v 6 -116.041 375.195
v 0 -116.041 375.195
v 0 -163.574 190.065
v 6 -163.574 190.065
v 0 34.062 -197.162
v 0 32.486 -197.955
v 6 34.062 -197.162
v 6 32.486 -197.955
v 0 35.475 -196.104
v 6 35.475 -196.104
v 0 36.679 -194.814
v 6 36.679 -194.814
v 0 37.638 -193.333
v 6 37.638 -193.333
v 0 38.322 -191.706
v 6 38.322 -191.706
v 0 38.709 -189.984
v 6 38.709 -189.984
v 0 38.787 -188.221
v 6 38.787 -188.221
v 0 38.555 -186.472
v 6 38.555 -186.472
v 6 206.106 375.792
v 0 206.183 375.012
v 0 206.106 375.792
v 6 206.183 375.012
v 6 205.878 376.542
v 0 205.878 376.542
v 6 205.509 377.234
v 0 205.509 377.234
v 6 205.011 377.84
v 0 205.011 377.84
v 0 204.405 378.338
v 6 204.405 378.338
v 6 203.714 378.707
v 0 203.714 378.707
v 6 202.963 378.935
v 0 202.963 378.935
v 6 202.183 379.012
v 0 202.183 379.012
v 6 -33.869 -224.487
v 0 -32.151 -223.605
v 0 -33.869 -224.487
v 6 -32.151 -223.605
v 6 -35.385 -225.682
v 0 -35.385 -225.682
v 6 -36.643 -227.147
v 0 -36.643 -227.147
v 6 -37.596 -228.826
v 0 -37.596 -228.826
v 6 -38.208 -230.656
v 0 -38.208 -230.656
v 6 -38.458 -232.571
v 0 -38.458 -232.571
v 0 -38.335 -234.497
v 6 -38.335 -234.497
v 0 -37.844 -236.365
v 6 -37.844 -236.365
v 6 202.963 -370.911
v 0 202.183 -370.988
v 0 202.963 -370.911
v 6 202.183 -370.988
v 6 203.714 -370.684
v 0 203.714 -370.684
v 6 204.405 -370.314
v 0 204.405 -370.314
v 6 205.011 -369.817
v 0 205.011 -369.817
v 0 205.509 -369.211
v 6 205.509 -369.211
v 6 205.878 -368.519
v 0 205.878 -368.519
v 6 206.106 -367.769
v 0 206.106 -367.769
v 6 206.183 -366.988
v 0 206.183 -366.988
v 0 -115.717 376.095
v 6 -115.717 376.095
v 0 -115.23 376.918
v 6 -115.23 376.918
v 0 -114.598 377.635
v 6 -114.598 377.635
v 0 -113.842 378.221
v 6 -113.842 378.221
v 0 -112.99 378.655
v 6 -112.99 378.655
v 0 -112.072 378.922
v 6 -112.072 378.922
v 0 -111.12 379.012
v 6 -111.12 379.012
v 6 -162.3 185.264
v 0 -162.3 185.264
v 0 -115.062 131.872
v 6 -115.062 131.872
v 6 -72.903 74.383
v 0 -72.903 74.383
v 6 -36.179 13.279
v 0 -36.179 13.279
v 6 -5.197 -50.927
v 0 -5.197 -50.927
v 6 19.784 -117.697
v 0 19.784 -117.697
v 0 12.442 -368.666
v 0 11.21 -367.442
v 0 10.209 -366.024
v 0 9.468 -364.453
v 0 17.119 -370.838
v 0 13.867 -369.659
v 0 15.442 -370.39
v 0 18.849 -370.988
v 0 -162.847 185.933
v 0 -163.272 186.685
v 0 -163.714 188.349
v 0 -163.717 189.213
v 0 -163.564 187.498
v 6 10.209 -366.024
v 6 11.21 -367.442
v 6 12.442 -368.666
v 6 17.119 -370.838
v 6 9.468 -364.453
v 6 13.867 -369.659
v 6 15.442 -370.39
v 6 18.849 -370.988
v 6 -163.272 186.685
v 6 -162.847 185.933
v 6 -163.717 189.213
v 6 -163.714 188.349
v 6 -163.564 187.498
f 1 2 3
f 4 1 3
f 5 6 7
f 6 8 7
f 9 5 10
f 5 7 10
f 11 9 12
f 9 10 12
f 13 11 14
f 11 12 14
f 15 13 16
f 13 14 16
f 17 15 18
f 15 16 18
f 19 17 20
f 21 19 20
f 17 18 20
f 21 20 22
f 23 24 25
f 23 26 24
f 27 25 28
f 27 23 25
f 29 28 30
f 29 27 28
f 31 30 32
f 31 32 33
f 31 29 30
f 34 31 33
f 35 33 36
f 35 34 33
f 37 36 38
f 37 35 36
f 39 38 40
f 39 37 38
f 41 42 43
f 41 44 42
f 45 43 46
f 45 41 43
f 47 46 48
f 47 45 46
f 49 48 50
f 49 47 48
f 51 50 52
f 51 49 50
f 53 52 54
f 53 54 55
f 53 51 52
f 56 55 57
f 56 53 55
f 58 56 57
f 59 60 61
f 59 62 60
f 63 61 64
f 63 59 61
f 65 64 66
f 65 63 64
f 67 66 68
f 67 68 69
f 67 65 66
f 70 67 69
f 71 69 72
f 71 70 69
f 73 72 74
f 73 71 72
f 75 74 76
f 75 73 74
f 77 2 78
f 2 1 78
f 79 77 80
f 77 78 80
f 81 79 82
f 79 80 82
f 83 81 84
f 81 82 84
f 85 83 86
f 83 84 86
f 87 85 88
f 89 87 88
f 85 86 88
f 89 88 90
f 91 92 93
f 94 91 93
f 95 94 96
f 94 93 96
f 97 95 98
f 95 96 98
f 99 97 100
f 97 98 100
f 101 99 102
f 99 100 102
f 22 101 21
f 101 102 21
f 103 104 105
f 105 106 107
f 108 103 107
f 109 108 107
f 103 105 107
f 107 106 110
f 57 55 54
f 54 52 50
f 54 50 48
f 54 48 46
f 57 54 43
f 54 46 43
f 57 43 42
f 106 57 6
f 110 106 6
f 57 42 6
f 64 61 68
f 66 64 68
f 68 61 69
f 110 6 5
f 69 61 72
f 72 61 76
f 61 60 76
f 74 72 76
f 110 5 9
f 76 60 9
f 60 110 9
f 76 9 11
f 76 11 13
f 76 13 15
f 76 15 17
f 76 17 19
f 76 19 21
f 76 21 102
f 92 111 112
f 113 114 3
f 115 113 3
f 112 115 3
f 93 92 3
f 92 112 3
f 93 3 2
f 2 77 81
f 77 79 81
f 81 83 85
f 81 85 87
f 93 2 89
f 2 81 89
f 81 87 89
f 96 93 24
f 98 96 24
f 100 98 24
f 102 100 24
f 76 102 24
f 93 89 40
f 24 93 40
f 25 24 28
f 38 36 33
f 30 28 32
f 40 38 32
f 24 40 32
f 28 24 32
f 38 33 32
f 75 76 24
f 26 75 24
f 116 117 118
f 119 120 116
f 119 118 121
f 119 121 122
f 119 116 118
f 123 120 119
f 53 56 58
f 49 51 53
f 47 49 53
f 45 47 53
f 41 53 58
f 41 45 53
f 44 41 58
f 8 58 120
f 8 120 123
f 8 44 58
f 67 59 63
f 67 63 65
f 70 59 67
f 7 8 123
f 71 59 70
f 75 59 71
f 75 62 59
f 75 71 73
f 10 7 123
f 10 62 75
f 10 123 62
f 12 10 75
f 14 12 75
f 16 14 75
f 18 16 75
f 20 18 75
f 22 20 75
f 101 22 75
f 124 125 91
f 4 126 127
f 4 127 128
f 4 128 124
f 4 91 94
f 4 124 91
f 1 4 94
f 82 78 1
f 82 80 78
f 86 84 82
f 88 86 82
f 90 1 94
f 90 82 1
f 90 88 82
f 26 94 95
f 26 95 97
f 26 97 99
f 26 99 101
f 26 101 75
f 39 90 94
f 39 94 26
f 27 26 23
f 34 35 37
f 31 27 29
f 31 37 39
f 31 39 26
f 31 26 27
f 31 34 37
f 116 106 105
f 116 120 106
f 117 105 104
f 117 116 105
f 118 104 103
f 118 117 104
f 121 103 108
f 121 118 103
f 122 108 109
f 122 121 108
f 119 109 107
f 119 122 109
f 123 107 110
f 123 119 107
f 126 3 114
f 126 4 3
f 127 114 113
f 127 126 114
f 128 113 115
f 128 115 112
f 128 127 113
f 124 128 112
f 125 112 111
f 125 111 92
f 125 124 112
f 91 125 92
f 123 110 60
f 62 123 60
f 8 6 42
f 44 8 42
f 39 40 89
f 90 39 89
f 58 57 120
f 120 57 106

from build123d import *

# Parameters (mm, degrees)
F1_DEPTH = 6
F2_R     = 10
F3_R     = 10
F4_R     = 10
F5_R     = 4
F6_R     = 4
F7_R     = 5.08
F8_R     = 5.08


with BuildPart() as f1:
    # F0 (on Right) → F1 (new body)
    with BuildSketch(Plane.YZ):
        with BuildLine():
            Line((206.182857, -370.988358), (206.182857, 379.011642))
            Line((206.182857, 379.011642), (-115.060672, 379.011642))
            Line((-115.060672, 379.011642), (-164.283467, 187.301795))
            ThreePointArc((-164.283467, 187.301795), (-34.827874, 10.767053), (40.379739, -194.82254))
            Line((40.379739, -194.82254), (-41.226477, -227.205956))
            Line((-41.226477, -227.205956), (11.882335, -370.988358))
            Line((11.882335, -370.988358), (206.182857, -370.988358))
        make_face()
    extrude(amount=F1_DEPTH)

    # F2
    f2_edges = [f1.edges().sort_by_distance(p)[0] for p in [
        (3, -41.226477, -227.205956),
    ]]
    fillet(f2_edges, radius=F2_R)

    # F3
    f3_edges = [f1.edges().sort_by_distance(p)[0] for p in [
        (3, 40.379739, -194.82254),
    ]]
    fillet(f3_edges, radius=F3_R)

    # F4
    f4_edges = [f1.edges().sort_by_distance(p)[0] for p in [
        (3, 11.882335, -370.988358),
    ]]
    fillet(f4_edges, radius=F4_R)

    # F5
    f5_edges = [f1.edges().sort_by_distance(p)[0] for p in [
        (3, 206.182857, -370.988358),
    ]]
    fillet(f5_edges, radius=F5_R)

    # F6
    f6_edges = [f1.edges().sort_by_distance(p)[0] for p in [
        (3, 206.182857, 379.011642),
    ]]
    fillet(f6_edges, radius=F6_R)

    # F7
    f7_edges = [f1.edges().sort_by_distance(p)[0] for p in [
        (3, -164.283467, 187.301795),
    ]]
    fillet(f7_edges, radius=F7_R)

    # F8
    f8_edges = [f1.edges().sort_by_distance(p)[0] for p in [
        (3, -115.060672, 379.011642),
    ]]
    fillet(f8_edges, radius=F8_R)


solid = f1.part
